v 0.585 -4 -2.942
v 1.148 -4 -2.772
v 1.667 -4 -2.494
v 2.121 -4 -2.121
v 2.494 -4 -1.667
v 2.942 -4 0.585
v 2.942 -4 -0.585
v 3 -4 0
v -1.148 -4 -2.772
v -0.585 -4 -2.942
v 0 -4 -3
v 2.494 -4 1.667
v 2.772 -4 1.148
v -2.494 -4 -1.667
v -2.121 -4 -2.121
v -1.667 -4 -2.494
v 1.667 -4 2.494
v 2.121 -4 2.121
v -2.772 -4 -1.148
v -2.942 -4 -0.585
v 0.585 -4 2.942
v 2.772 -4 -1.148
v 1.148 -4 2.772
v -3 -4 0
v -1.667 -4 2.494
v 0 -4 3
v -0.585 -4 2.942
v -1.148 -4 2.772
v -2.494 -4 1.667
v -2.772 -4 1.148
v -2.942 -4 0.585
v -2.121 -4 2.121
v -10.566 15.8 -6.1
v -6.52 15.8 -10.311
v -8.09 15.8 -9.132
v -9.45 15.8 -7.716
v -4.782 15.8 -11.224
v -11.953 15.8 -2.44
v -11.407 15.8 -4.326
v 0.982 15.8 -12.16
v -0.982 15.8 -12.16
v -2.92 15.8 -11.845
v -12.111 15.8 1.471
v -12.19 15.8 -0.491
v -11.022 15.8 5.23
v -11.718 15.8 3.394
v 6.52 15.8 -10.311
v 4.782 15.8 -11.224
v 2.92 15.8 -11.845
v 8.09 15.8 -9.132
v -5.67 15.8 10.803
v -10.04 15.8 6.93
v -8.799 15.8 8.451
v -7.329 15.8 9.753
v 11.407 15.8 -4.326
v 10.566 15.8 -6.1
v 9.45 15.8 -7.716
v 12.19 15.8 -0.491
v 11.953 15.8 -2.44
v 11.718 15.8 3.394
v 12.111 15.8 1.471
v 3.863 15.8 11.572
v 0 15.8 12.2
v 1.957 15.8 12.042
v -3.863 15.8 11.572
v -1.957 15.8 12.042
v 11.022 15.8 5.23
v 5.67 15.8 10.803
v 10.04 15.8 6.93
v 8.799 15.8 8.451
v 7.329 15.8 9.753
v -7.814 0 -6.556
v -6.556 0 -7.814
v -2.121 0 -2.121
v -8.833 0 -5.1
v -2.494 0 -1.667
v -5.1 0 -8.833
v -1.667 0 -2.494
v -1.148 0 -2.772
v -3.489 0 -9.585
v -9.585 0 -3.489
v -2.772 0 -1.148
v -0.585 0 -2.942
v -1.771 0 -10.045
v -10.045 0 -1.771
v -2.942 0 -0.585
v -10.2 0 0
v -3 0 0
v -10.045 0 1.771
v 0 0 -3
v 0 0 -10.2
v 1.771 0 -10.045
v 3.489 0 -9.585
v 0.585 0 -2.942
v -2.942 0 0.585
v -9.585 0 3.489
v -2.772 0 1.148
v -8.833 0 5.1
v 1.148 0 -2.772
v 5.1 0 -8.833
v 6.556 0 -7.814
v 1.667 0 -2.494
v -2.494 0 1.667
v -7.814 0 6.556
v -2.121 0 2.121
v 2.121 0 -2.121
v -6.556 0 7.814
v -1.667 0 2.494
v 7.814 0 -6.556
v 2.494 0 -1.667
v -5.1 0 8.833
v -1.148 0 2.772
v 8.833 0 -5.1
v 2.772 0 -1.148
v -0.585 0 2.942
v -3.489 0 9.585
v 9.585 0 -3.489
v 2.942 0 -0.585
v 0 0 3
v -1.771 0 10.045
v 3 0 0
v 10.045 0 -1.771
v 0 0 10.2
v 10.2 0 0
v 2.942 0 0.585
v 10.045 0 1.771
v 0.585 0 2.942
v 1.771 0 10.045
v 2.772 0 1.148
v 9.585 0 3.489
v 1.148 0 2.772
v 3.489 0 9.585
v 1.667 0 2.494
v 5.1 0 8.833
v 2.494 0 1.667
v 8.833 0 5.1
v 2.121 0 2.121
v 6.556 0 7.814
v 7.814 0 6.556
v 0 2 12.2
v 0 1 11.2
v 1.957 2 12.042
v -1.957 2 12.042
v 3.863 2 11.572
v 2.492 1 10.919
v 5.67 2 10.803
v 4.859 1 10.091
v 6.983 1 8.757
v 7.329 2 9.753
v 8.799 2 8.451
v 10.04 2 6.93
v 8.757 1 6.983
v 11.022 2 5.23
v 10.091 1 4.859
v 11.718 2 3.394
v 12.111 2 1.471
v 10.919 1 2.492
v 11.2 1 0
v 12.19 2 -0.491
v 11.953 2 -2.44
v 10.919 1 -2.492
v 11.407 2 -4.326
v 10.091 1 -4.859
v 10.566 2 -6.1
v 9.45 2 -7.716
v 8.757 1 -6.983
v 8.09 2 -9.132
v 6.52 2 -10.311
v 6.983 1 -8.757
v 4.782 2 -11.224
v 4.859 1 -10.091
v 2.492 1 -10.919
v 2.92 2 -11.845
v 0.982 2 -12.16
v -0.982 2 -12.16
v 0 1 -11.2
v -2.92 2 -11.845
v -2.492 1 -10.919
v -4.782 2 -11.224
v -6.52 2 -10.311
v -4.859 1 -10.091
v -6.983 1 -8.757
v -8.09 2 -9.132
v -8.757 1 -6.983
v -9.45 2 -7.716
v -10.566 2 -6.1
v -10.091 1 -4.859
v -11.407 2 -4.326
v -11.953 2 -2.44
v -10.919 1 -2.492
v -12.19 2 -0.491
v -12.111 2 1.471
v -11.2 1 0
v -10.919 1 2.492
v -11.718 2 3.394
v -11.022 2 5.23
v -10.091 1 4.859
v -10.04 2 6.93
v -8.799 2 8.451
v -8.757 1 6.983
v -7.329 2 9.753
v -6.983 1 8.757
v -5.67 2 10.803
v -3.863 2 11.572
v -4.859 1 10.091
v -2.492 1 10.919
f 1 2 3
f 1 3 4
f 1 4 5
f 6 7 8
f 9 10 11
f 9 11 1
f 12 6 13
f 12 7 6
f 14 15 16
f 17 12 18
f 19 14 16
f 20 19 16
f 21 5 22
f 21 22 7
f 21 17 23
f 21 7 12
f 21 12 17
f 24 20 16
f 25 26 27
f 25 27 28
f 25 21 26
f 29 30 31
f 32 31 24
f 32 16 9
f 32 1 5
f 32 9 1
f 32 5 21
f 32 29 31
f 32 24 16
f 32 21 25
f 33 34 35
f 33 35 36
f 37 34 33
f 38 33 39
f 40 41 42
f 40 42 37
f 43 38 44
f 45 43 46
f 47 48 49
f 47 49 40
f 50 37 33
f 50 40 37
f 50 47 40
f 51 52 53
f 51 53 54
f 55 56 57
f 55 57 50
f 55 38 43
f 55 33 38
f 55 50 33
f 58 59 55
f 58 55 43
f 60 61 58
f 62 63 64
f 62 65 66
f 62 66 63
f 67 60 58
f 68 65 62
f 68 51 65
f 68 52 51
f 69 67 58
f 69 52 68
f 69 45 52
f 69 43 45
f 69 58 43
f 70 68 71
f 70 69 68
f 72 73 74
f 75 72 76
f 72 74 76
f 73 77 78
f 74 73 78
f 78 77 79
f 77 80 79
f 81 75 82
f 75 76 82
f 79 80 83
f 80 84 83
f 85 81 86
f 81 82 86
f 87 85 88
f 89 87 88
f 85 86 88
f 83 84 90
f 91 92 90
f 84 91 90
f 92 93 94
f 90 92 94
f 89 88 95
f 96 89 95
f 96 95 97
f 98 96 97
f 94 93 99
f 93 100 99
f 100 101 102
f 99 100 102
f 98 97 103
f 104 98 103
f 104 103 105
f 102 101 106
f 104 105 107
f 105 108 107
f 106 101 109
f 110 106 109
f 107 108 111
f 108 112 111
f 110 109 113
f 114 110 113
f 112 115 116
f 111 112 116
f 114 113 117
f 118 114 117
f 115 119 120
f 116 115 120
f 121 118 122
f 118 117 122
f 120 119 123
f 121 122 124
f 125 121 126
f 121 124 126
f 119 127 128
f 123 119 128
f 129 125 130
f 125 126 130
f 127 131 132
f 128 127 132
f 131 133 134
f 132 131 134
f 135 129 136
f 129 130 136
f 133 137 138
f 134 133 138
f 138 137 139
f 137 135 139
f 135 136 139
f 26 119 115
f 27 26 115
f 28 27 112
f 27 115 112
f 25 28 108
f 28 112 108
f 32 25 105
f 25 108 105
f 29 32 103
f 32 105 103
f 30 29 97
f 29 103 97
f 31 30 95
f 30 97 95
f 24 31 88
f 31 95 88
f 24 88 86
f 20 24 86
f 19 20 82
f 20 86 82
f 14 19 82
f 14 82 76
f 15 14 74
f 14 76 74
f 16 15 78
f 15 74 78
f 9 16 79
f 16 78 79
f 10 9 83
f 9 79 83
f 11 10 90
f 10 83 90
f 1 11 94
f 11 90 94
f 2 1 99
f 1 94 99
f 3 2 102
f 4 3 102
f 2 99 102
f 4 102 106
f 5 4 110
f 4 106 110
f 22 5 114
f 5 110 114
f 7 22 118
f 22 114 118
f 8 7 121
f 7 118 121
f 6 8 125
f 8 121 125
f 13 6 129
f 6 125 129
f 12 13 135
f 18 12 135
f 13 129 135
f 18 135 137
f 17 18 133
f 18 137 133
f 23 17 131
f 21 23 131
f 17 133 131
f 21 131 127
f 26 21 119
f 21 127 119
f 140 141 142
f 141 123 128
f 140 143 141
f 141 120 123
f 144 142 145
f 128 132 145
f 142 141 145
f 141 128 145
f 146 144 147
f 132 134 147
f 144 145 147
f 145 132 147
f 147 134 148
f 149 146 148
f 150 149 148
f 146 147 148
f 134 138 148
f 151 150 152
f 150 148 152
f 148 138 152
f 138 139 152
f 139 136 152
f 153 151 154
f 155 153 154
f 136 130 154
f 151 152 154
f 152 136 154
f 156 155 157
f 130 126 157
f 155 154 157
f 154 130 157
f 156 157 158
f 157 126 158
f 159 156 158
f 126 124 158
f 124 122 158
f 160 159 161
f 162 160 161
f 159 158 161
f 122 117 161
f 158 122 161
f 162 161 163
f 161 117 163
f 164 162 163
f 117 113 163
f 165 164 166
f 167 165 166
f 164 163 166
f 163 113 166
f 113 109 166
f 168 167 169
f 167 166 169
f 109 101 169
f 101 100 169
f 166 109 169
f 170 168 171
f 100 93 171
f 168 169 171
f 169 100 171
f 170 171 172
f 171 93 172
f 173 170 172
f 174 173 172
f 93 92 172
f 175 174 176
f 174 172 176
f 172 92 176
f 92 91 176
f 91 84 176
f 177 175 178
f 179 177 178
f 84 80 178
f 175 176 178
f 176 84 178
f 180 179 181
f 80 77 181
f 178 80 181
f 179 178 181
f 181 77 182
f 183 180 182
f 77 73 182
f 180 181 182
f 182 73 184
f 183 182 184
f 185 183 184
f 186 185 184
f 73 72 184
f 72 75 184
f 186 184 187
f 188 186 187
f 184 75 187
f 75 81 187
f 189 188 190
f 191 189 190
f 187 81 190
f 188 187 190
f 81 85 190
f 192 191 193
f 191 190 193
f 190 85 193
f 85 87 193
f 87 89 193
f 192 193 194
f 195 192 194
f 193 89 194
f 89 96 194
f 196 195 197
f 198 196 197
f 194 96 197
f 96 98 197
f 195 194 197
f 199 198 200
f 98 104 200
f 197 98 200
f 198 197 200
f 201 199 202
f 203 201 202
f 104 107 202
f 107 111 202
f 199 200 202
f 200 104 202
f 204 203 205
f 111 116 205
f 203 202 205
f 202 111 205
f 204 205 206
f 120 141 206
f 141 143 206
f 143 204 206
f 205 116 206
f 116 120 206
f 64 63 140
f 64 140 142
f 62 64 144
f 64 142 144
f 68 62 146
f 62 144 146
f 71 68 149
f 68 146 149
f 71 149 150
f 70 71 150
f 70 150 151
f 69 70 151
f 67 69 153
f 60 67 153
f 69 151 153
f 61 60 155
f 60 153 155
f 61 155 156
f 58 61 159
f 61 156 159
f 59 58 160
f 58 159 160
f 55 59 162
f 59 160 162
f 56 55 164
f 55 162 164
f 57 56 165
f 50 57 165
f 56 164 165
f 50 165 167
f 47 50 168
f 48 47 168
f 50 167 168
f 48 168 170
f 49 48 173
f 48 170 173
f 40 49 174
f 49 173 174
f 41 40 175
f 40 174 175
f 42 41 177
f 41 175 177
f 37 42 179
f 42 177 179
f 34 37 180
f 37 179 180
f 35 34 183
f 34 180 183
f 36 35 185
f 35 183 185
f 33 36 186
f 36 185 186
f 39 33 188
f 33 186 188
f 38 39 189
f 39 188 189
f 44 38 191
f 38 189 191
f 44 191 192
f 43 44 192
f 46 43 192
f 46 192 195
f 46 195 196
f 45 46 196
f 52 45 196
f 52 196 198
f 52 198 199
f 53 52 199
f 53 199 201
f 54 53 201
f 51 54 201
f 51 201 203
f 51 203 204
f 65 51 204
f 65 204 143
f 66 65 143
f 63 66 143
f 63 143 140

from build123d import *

# Parameters (mm, degrees)
SKETCH_1_R      = 12.2
EXTRUDE_1_DEPTH = 15.8
CHAMFER_1_SIZE  = 2
SKETCH_2_R      = 3
EXTRUDE_2_DEPTH = 4


with BuildPart() as part:
    # 草图1 → 凸台-拉伸1 (new body)
    with BuildSketch(Plane(origin=(0, 0, 0), x_dir=(1, 0, 0), z_dir=(0, 1, 0))):
        with Locations(Location((0, 0, 0), (0, 0, 270))):
            Circle(SKETCH_1_R)
    extrude(amount=EXTRUDE_1_DEPTH)

    # 倒角1
    chamfer_1_edges = [part.edges().sort_by_distance(p)[0] for p in [
        (0, 0, -12.2),
    ]]
    chamfer(chamfer_1_edges, length=CHAMFER_1_SIZE)

    # 草图2 → 凸台-拉伸2 (add)
    with BuildSketch(Plane.XZ):
        with Locations(Location((0, 0, 0), (0, 0, 90))):
            Circle(SKETCH_2_R)
    extrude(amount=EXTRUDE_2_DEPTH)


solid = part.part
